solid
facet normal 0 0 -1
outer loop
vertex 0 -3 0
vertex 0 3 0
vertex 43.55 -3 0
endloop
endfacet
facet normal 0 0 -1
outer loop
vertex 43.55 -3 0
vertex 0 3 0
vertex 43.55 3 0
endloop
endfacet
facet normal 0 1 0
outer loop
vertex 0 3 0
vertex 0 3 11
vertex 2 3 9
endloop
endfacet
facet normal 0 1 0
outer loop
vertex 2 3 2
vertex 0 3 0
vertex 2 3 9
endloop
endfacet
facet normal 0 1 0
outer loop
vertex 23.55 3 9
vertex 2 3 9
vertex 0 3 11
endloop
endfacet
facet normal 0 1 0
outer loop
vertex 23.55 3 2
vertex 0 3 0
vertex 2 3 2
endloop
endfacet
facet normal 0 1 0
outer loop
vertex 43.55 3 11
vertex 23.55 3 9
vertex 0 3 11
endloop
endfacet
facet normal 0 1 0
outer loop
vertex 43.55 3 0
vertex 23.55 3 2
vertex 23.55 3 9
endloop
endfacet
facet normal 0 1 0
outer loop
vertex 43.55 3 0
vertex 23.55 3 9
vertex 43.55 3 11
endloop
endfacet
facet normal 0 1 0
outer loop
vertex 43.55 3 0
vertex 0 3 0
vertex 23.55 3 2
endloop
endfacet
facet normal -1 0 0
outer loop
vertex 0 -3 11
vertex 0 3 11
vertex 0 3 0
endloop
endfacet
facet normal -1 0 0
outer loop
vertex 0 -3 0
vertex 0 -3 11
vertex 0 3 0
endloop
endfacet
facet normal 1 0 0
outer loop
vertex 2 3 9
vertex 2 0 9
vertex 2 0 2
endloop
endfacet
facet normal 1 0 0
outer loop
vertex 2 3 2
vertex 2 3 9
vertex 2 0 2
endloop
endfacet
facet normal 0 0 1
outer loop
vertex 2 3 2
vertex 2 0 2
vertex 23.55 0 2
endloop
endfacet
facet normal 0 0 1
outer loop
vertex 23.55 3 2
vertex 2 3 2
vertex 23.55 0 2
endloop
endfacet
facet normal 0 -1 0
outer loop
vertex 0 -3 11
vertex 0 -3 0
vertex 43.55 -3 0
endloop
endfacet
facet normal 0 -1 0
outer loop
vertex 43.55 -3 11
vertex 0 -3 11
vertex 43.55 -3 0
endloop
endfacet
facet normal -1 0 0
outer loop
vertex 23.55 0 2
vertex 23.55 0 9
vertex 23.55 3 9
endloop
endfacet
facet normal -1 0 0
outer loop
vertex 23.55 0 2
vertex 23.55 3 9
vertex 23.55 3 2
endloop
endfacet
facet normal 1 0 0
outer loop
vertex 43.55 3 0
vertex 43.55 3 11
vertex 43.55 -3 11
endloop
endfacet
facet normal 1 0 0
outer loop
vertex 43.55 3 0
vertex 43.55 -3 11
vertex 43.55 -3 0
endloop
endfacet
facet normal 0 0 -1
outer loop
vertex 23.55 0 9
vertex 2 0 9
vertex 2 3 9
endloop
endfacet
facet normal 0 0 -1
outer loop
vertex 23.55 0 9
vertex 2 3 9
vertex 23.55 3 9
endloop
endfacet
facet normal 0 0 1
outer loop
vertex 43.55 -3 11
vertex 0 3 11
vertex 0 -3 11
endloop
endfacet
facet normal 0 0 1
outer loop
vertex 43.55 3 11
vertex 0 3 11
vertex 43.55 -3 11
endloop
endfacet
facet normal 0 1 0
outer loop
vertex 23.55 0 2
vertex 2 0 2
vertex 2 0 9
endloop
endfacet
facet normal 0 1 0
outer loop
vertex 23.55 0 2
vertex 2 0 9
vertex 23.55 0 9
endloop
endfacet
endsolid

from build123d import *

# Parameters (mm, degrees)
SKETCH1_W           = 43.55
SKETCH1_H           = 11
SKETCH1_W_2         = 21.55
SKETCH1_H_2         = 7
BOSS_EXTRUDE1_DEPTH = 3
SKETCH1_2_W         = 43.55
SKETCH1_2_H         = 11
BOSS_EXTRUDE2_DEPTH = 3


with BuildPart() as part:
    # Sketch1 → Boss-Extrude1 (new body)
    with BuildSketch(Plane(origin=(0, 0, 0), x_dir=(1, 0, 0), z_dir=(0, 1, 0))):
        with Locations((21.775, -5.5)):
            Rectangle(SKETCH1_W, SKETCH1_H)
        with Locations((12.775, -5.5)):
            Rectangle(SKETCH1_W_2, SKETCH1_H_2, mode=Mode.SUBTRACT)
    extrude(amount=BOSS_EXTRUDE1_DEPTH)

    # Sketch1<2> → Boss-Extrude2 (add)
    with BuildSketch(Plane(origin=(0, 0, 0), x_dir=(1, 0, 0), z_dir=(0, 1, 0))):
        with Locations((21.775, -5.5)):
            Rectangle(SKETCH1_2_W, SKETCH1_2_H)
    extrude(amount=-BOSS_EXTRUDE2_DEPTH)


solid = part.part
